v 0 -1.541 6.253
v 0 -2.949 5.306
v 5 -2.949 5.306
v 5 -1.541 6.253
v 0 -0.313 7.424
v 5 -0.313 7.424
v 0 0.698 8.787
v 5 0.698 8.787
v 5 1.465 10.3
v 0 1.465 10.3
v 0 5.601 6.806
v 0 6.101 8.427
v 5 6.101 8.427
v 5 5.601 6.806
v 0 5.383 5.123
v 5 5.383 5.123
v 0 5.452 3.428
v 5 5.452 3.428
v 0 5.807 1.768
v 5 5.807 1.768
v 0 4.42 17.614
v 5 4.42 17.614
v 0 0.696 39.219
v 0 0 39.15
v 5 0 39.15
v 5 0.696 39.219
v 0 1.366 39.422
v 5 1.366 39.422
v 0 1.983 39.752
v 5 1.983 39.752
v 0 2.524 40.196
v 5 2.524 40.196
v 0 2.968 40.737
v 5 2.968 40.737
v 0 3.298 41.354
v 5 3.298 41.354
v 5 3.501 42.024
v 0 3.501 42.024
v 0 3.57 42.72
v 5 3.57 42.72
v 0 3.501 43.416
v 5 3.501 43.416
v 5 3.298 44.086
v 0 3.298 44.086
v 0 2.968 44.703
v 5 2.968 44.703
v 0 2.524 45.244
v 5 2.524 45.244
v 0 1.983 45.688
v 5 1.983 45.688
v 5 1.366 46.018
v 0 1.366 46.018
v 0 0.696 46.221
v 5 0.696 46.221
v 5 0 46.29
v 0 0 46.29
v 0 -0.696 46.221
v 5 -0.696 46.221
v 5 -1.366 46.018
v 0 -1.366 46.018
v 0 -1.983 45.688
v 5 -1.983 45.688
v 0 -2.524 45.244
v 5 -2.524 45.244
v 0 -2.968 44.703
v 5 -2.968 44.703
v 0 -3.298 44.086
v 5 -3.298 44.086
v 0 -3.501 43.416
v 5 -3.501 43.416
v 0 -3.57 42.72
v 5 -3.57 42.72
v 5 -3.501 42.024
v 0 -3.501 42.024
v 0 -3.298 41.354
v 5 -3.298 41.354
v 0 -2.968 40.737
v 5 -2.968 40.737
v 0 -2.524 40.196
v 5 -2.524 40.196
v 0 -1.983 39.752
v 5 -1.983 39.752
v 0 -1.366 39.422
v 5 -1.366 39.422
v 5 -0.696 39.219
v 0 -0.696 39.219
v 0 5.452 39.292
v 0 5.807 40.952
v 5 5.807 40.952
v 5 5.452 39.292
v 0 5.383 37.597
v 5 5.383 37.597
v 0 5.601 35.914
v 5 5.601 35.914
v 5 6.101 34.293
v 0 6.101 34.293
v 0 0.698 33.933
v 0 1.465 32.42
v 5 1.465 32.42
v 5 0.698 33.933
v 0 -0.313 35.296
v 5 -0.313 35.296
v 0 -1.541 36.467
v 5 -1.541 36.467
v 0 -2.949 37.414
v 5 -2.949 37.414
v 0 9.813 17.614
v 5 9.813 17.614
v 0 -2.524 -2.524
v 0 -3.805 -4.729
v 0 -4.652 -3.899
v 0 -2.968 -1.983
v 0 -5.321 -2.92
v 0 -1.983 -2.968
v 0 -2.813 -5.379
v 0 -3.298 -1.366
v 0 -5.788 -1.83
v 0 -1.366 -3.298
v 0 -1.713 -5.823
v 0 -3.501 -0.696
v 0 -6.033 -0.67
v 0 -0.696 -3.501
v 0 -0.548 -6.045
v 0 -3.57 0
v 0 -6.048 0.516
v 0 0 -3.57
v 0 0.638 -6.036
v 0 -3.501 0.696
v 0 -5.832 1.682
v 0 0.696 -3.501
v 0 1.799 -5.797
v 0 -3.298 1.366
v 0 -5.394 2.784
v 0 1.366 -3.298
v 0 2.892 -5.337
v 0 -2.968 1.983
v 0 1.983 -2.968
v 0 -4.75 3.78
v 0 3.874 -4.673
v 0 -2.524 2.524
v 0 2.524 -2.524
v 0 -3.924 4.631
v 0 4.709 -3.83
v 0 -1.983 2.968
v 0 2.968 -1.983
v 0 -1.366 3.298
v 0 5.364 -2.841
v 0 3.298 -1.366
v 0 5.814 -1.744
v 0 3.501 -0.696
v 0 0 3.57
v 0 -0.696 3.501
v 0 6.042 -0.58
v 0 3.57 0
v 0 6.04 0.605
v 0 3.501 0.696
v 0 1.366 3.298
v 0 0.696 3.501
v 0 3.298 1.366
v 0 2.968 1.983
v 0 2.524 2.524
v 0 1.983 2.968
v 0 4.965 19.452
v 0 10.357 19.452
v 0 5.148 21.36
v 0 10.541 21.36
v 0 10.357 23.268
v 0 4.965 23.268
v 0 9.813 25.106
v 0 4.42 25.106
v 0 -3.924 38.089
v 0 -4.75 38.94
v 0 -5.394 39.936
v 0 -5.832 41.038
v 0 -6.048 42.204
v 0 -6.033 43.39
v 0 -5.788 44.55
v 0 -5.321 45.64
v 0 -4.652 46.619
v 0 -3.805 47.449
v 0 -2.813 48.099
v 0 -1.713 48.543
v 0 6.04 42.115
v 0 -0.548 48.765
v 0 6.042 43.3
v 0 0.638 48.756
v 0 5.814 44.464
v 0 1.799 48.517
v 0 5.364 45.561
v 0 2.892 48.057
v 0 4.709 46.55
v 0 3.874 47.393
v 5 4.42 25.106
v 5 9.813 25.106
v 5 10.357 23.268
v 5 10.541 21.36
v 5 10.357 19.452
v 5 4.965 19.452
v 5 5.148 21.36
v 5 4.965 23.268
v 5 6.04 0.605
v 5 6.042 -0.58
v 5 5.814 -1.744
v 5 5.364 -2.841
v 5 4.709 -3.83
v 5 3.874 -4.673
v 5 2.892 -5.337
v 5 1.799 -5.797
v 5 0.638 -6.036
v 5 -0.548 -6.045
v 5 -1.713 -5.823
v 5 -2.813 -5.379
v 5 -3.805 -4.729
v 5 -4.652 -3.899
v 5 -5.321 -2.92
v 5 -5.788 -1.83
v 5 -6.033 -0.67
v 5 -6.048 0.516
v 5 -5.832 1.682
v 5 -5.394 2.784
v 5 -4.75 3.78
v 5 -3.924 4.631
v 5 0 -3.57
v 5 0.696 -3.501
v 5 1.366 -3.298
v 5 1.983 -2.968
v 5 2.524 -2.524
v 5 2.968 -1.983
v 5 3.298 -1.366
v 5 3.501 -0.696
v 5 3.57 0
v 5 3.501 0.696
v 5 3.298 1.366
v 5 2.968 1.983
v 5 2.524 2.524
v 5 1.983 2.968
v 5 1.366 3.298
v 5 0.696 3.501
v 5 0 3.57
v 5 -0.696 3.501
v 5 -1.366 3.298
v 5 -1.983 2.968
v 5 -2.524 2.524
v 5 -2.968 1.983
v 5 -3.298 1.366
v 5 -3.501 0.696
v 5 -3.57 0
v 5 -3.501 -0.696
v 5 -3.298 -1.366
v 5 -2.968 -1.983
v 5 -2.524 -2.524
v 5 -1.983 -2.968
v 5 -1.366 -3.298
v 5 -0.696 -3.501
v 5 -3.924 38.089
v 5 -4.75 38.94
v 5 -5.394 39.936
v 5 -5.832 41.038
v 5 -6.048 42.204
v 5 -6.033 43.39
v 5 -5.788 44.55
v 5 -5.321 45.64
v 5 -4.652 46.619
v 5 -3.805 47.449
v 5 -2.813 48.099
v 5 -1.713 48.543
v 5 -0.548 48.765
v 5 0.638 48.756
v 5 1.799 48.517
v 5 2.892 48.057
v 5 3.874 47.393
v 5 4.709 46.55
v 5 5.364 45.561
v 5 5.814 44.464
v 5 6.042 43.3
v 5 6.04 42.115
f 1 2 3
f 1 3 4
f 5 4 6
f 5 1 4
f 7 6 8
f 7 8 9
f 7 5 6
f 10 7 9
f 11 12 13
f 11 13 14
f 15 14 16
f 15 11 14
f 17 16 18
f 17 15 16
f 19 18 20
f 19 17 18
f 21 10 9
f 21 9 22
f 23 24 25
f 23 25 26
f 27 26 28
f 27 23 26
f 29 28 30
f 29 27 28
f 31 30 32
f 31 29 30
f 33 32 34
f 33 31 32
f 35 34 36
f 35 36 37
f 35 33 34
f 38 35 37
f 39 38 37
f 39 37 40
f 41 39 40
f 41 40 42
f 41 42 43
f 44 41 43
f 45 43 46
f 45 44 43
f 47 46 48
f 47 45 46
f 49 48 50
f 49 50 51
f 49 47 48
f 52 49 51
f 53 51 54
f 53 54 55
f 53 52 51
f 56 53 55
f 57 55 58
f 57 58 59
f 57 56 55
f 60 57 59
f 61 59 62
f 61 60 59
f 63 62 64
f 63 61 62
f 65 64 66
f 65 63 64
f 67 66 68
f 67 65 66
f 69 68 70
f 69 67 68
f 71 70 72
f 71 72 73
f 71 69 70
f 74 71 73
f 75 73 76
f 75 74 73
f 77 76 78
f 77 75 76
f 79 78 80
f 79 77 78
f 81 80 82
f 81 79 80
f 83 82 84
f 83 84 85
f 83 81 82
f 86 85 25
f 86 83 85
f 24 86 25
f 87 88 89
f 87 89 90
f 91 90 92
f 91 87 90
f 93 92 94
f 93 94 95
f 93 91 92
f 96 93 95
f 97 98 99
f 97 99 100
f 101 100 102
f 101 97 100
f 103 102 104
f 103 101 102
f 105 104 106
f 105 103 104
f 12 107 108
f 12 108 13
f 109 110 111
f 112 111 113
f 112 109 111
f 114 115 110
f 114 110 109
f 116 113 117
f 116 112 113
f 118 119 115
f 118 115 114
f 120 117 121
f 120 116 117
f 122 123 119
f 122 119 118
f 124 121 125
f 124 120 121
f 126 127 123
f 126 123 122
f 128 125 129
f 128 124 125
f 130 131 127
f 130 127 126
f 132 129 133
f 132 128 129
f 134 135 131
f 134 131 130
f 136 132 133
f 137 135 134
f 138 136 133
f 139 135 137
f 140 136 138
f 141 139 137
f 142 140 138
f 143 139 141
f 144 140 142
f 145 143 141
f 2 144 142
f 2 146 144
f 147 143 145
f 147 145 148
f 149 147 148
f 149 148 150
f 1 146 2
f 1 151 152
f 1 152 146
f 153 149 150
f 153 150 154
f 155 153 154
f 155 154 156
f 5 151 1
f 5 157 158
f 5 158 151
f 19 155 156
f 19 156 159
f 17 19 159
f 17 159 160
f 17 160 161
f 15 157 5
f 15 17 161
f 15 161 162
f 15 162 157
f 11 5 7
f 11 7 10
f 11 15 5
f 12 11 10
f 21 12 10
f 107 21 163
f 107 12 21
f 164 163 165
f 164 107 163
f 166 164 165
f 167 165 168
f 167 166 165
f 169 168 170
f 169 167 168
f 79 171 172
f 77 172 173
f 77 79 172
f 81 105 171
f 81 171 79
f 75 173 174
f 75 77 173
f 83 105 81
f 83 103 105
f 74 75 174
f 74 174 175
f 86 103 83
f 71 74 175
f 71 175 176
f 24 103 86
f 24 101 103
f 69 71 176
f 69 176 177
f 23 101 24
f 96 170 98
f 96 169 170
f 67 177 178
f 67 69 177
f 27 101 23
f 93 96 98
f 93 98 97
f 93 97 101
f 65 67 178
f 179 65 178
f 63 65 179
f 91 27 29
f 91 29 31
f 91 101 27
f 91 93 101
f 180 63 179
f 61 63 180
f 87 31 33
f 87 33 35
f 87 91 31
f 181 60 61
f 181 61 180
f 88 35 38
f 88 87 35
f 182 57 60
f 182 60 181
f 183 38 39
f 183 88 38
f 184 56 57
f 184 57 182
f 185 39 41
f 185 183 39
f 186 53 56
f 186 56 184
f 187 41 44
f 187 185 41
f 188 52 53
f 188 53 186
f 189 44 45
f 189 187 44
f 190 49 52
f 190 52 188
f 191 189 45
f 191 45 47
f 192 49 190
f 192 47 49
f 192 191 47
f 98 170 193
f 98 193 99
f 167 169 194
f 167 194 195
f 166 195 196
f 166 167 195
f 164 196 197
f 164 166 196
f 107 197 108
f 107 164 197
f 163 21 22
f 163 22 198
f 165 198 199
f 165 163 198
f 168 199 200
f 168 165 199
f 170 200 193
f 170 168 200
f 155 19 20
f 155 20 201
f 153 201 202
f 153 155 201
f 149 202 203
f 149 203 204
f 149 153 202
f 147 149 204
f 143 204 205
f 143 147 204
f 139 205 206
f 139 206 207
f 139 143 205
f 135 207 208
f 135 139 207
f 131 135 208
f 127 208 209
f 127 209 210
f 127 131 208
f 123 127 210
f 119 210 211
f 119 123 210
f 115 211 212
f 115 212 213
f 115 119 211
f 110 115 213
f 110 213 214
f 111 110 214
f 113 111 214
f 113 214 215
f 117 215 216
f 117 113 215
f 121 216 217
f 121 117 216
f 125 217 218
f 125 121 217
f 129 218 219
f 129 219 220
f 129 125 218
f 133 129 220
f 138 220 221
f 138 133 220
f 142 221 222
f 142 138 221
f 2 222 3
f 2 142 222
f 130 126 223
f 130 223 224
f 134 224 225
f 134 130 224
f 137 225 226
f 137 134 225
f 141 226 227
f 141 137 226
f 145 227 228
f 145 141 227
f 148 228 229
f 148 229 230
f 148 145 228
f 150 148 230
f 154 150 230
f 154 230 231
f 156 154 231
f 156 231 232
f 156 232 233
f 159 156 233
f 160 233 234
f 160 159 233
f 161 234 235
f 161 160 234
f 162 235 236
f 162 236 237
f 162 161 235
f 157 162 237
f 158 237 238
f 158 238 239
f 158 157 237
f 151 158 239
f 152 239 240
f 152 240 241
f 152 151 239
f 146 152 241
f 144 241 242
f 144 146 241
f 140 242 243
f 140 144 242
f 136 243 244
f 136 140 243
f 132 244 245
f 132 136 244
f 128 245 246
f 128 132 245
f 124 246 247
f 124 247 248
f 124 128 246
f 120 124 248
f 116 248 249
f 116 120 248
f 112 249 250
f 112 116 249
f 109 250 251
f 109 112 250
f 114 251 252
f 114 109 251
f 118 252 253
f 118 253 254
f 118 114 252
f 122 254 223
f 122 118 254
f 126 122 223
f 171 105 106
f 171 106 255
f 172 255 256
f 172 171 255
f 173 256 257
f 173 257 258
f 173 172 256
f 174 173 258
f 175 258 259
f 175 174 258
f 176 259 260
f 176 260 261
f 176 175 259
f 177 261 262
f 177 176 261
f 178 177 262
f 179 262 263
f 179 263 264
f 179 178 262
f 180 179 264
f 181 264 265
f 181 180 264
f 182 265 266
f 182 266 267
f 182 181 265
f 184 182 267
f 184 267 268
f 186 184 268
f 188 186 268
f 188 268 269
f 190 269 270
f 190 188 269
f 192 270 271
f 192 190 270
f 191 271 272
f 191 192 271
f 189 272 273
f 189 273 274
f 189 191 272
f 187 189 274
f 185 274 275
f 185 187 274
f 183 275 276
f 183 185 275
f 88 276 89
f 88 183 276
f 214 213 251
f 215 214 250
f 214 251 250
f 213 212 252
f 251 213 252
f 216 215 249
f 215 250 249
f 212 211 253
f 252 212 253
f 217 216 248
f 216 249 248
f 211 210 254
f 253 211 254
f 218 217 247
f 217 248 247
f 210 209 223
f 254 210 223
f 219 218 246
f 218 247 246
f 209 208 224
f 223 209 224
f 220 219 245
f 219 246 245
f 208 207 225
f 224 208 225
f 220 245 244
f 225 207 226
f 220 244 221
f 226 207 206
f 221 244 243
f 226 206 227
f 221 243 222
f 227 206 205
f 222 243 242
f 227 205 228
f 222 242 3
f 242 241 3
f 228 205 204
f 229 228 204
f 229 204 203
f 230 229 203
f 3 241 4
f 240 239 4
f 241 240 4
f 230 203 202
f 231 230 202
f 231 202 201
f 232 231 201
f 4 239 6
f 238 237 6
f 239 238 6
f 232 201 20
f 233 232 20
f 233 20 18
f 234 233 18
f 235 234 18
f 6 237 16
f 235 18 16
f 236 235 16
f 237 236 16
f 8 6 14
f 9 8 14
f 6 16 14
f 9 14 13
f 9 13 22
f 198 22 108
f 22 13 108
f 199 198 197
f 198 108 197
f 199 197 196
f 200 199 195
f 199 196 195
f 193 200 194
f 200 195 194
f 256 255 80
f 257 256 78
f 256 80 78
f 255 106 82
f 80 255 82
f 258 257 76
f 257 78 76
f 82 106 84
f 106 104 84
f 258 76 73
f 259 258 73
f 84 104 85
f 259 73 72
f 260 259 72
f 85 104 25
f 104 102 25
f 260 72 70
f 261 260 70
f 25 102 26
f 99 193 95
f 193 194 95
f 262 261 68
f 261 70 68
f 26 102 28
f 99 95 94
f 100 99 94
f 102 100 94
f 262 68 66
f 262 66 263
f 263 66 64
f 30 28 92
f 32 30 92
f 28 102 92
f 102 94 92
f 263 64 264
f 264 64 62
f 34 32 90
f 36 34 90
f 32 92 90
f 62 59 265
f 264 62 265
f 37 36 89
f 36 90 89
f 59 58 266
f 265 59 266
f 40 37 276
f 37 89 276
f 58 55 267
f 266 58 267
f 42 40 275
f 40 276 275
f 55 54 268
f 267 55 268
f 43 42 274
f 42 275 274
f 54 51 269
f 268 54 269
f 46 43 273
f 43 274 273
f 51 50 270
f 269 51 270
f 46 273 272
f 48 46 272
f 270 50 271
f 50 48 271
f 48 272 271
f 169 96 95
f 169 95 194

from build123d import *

# Parameters (mm, degrees)
SKETCH1_R           = 3.57
BOSS_EXTRUDE1_DEPTH = 5


with BuildPart() as part:
    # Sketch1 → Boss-Extrude1 (new body)
    with BuildSketch(Plane(origin=(0, 0, 0), x_dir=(0, 0, -1), z_dir=(1, 0, 0))):
        with BuildLine():
            Line((-34.292652671, 6.101206192), (-25.106065934, 9.812828159))
            ThreePointArc((-25.106065934, 9.812828159), (-21.36, 10.540989614), (-17.613934066, 9.812828159))
            Line((-17.613934066, 9.812828159), (-8.427347329, 6.101206192))
            ThreePointArc((-8.427347329, 6.101206192), (-5.123042901, 5.382807164), (-1.768225144, 5.806744341))
            ThreePointArc((-1.768225144, 5.806744341), (5.628005997, -2.273862022), (-5.305658284, -2.948709917))
            ThreePointArc((-5.305658284, -2.948709917), (-7.424420711, -0.313302797), (-10.300380296, 1.465286919))
            Line((-10.300380296, 1.465286919), (-17.613934066, 4.420154446))
            ThreePointArc((-17.613934066, 4.420154446), (-21.36, 5.1483159), (-25.106065934, 4.420154446))
            Line((-25.106065934, 4.420154446), (-32.419619704, 1.465286919))
            ThreePointArc((-32.419619704, 1.465286919), (-35.295579289, -0.313302797), (-37.414341716, -2.948709917))
            ThreePointArc((-37.414341716, -2.948709917), (-48.348005997, -2.273862022), (-40.951774856, 5.806744341))
            ThreePointArc((-40.951774856, 5.806744341), (-37.596957099, 5.382807164), (-34.292652671, 6.101206192))
        make_face()
        Circle(SKETCH1_R, mode=Mode.SUBTRACT)
        with Locations((-42.72, 0)):
            Circle(SKETCH1_R, mode=Mode.SUBTRACT)
    extrude(amount=BOSS_EXTRUDE1_DEPTH)


solid = part.part
